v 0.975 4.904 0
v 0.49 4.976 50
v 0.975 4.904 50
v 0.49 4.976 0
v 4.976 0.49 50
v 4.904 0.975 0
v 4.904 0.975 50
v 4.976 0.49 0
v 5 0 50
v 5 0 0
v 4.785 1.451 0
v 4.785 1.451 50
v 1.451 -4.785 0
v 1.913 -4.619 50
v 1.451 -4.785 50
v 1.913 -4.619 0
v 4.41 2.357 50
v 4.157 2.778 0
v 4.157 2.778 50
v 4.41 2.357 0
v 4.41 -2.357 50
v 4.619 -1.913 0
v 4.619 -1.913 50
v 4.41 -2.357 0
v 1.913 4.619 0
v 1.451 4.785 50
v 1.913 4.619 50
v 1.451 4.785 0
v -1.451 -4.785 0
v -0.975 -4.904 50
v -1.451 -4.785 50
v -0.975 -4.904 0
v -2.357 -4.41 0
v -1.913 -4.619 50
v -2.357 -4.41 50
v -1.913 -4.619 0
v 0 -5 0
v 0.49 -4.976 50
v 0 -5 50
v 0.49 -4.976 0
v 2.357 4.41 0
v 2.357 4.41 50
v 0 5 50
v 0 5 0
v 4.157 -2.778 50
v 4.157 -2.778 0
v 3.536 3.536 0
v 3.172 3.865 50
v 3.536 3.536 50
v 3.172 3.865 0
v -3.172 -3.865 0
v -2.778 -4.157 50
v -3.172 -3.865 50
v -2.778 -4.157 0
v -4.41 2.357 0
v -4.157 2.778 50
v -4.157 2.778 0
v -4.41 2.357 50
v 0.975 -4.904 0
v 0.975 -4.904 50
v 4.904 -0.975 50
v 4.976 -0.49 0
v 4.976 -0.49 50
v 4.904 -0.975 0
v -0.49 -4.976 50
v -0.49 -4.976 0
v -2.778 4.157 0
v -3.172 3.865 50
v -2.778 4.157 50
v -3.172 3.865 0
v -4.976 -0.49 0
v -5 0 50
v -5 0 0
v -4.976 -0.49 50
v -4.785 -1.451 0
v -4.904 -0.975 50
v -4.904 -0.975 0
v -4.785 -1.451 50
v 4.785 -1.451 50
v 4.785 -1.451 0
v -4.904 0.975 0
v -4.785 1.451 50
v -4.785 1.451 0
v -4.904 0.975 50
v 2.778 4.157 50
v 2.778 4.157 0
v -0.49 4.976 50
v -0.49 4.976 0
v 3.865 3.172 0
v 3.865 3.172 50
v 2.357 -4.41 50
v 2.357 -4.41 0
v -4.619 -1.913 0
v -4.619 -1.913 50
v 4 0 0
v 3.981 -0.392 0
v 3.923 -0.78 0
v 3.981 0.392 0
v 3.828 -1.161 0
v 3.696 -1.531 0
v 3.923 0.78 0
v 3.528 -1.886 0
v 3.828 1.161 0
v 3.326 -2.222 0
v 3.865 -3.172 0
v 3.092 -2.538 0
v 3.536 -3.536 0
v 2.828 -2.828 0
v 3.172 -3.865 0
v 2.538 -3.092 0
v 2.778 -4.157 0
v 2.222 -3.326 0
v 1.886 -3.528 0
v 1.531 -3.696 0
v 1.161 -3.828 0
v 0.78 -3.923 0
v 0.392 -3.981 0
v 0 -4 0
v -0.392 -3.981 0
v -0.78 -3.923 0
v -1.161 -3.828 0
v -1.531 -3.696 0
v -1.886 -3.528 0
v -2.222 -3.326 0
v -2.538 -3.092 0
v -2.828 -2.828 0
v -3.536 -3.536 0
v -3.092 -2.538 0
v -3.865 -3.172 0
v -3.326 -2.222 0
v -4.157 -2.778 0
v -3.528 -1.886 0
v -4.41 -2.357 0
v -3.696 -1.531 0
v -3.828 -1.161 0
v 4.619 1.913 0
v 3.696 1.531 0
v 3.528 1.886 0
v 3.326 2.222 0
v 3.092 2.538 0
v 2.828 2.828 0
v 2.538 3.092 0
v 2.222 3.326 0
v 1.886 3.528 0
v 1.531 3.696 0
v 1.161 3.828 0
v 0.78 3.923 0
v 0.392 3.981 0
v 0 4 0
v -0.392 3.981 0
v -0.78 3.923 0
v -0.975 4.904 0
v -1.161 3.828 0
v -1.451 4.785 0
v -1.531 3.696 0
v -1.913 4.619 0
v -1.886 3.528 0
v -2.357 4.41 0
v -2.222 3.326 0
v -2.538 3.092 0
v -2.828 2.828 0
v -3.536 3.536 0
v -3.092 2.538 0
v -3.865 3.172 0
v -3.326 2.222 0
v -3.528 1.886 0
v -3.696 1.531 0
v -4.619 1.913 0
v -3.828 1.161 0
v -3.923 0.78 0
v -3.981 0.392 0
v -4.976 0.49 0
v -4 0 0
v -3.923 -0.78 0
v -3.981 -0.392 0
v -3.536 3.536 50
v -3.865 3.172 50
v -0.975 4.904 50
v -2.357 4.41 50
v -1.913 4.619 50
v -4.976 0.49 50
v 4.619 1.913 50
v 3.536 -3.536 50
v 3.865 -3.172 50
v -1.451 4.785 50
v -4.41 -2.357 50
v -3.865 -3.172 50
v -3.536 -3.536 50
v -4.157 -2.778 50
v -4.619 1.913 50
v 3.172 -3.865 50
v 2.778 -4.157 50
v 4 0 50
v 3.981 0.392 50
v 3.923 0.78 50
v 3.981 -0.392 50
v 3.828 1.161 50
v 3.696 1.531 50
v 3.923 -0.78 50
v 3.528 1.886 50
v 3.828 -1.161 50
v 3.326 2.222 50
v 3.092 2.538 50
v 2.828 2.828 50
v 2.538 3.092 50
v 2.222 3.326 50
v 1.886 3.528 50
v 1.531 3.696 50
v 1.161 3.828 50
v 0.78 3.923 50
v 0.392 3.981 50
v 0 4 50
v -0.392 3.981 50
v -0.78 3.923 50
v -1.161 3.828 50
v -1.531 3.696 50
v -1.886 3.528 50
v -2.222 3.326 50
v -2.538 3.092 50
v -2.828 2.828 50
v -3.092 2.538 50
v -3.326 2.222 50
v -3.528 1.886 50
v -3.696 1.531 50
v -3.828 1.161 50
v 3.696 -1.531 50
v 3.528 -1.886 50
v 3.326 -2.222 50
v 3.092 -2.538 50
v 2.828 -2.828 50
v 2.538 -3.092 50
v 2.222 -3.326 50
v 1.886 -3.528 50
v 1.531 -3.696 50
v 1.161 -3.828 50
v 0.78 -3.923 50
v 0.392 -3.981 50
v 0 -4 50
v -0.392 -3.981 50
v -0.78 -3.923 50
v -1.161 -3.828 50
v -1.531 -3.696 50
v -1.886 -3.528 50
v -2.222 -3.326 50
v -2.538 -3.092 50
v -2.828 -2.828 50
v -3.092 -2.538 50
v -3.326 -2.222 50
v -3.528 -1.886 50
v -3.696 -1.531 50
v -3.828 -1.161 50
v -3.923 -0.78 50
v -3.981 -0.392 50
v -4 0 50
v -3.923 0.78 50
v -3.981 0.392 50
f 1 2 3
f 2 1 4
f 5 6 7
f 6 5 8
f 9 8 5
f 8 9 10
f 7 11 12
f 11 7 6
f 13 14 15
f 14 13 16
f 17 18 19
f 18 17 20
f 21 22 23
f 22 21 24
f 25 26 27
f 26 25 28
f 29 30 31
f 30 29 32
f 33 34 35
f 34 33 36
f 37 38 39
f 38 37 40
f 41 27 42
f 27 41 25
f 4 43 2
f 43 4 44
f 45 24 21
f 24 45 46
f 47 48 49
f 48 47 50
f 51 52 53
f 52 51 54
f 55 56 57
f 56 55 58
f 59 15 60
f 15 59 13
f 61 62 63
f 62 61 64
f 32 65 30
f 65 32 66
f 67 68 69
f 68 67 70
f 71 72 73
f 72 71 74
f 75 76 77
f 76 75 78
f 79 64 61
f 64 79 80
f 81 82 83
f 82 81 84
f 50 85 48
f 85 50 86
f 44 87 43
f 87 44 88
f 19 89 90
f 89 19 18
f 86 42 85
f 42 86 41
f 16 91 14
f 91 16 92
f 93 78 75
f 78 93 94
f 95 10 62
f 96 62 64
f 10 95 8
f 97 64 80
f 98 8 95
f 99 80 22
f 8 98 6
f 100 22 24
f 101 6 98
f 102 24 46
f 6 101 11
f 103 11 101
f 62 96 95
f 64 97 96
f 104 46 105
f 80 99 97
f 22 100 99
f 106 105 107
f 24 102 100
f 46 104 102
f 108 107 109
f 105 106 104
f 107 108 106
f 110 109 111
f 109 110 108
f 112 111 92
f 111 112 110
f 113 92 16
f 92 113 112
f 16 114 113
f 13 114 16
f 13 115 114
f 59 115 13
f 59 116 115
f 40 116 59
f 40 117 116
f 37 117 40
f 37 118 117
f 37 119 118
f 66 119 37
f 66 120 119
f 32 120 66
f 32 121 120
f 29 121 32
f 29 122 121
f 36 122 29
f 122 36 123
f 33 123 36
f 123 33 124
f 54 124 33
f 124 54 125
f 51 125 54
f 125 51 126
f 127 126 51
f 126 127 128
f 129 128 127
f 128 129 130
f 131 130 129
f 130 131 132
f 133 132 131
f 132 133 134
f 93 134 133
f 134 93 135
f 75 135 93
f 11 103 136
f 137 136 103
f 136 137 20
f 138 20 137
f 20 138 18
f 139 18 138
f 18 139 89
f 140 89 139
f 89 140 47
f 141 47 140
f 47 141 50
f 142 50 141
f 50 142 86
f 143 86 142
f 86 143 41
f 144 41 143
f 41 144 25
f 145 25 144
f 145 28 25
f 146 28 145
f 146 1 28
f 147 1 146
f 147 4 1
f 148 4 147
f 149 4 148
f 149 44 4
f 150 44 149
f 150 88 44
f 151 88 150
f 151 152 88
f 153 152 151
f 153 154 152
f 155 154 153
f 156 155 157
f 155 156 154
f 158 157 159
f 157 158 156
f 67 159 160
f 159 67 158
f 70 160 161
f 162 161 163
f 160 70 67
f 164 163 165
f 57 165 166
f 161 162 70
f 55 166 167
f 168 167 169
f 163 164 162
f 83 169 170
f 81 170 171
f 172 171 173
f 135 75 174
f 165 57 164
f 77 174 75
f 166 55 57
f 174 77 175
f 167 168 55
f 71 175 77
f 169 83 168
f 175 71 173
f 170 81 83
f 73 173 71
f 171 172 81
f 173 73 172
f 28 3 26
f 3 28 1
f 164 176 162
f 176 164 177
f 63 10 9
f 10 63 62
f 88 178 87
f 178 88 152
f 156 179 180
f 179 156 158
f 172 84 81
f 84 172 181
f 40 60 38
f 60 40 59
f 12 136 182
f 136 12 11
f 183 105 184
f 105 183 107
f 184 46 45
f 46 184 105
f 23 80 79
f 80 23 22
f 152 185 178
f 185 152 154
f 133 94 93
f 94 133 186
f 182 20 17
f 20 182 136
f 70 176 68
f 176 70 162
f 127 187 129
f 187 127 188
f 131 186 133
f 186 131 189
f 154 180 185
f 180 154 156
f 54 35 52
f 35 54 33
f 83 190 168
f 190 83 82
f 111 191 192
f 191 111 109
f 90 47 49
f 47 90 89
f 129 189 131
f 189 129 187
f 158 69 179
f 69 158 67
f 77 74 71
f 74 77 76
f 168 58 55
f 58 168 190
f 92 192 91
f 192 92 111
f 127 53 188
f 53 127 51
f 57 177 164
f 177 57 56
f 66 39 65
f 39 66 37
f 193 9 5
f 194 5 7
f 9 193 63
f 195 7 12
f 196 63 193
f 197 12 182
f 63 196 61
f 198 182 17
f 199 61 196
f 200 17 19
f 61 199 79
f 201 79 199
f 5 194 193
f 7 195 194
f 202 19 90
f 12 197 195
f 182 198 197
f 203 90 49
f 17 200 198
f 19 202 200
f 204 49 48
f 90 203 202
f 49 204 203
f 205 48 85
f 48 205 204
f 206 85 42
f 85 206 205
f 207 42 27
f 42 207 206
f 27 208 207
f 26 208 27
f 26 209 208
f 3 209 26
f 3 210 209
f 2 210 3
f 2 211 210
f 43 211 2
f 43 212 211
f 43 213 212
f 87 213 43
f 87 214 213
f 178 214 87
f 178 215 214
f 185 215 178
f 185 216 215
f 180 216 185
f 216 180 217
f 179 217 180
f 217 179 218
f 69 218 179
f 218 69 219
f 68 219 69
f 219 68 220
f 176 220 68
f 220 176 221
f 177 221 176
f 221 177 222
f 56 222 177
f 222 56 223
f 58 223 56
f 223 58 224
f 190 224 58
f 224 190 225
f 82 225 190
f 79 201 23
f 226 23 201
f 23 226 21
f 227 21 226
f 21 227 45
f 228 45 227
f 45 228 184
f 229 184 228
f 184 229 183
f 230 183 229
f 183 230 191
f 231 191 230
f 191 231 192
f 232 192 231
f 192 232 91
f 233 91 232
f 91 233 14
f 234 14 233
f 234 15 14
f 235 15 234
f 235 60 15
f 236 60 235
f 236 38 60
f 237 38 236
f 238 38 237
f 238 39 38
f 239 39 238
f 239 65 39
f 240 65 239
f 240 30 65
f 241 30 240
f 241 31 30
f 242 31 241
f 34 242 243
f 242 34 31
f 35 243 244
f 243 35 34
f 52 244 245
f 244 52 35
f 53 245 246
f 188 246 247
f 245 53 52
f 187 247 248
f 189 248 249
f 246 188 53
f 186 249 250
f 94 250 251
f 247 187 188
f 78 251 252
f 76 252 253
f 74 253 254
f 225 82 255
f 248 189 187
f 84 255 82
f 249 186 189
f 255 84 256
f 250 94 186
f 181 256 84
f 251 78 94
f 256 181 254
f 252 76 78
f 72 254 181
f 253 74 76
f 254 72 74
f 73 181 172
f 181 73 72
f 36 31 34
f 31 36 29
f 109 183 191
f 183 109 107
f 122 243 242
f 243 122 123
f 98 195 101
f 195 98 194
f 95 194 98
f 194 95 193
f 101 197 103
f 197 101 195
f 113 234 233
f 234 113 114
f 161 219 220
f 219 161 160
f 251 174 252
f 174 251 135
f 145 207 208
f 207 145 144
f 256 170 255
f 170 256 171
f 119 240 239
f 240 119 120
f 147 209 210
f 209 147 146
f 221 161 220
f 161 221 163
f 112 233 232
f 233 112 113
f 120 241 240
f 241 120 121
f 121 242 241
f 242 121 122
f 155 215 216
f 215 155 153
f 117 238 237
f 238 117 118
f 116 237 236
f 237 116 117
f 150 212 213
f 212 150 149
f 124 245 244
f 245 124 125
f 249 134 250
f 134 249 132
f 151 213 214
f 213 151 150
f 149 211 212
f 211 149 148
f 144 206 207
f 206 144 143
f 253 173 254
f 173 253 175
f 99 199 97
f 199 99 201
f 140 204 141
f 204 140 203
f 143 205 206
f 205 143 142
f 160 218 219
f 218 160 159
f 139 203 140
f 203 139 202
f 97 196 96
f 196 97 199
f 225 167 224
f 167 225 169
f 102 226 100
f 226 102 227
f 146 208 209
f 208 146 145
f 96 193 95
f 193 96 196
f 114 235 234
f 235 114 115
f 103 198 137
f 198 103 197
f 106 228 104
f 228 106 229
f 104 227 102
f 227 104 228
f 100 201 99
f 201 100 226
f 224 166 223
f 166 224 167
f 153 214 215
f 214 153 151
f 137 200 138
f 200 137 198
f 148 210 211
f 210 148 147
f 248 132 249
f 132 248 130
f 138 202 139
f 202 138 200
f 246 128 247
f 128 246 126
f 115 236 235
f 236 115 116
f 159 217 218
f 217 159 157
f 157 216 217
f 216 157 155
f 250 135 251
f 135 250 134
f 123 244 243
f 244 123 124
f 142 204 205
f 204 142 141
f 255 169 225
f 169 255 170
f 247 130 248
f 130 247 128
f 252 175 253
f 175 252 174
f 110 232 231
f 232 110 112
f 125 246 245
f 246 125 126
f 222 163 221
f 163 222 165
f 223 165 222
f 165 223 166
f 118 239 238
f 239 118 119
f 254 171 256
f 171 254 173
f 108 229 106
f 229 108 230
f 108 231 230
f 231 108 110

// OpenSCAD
module heatshrink_sleeving(outer_diameter=10, inner_diameter=8, length=50) {
    difference() {
        cylinder(h=length, d=outer_diameter, $fn=64);
        translate([0, 0, -1])
            cylinder(h=length + 2, d=inner_diameter, $fn=64);
    }
}

heatshrink_sleeving();
